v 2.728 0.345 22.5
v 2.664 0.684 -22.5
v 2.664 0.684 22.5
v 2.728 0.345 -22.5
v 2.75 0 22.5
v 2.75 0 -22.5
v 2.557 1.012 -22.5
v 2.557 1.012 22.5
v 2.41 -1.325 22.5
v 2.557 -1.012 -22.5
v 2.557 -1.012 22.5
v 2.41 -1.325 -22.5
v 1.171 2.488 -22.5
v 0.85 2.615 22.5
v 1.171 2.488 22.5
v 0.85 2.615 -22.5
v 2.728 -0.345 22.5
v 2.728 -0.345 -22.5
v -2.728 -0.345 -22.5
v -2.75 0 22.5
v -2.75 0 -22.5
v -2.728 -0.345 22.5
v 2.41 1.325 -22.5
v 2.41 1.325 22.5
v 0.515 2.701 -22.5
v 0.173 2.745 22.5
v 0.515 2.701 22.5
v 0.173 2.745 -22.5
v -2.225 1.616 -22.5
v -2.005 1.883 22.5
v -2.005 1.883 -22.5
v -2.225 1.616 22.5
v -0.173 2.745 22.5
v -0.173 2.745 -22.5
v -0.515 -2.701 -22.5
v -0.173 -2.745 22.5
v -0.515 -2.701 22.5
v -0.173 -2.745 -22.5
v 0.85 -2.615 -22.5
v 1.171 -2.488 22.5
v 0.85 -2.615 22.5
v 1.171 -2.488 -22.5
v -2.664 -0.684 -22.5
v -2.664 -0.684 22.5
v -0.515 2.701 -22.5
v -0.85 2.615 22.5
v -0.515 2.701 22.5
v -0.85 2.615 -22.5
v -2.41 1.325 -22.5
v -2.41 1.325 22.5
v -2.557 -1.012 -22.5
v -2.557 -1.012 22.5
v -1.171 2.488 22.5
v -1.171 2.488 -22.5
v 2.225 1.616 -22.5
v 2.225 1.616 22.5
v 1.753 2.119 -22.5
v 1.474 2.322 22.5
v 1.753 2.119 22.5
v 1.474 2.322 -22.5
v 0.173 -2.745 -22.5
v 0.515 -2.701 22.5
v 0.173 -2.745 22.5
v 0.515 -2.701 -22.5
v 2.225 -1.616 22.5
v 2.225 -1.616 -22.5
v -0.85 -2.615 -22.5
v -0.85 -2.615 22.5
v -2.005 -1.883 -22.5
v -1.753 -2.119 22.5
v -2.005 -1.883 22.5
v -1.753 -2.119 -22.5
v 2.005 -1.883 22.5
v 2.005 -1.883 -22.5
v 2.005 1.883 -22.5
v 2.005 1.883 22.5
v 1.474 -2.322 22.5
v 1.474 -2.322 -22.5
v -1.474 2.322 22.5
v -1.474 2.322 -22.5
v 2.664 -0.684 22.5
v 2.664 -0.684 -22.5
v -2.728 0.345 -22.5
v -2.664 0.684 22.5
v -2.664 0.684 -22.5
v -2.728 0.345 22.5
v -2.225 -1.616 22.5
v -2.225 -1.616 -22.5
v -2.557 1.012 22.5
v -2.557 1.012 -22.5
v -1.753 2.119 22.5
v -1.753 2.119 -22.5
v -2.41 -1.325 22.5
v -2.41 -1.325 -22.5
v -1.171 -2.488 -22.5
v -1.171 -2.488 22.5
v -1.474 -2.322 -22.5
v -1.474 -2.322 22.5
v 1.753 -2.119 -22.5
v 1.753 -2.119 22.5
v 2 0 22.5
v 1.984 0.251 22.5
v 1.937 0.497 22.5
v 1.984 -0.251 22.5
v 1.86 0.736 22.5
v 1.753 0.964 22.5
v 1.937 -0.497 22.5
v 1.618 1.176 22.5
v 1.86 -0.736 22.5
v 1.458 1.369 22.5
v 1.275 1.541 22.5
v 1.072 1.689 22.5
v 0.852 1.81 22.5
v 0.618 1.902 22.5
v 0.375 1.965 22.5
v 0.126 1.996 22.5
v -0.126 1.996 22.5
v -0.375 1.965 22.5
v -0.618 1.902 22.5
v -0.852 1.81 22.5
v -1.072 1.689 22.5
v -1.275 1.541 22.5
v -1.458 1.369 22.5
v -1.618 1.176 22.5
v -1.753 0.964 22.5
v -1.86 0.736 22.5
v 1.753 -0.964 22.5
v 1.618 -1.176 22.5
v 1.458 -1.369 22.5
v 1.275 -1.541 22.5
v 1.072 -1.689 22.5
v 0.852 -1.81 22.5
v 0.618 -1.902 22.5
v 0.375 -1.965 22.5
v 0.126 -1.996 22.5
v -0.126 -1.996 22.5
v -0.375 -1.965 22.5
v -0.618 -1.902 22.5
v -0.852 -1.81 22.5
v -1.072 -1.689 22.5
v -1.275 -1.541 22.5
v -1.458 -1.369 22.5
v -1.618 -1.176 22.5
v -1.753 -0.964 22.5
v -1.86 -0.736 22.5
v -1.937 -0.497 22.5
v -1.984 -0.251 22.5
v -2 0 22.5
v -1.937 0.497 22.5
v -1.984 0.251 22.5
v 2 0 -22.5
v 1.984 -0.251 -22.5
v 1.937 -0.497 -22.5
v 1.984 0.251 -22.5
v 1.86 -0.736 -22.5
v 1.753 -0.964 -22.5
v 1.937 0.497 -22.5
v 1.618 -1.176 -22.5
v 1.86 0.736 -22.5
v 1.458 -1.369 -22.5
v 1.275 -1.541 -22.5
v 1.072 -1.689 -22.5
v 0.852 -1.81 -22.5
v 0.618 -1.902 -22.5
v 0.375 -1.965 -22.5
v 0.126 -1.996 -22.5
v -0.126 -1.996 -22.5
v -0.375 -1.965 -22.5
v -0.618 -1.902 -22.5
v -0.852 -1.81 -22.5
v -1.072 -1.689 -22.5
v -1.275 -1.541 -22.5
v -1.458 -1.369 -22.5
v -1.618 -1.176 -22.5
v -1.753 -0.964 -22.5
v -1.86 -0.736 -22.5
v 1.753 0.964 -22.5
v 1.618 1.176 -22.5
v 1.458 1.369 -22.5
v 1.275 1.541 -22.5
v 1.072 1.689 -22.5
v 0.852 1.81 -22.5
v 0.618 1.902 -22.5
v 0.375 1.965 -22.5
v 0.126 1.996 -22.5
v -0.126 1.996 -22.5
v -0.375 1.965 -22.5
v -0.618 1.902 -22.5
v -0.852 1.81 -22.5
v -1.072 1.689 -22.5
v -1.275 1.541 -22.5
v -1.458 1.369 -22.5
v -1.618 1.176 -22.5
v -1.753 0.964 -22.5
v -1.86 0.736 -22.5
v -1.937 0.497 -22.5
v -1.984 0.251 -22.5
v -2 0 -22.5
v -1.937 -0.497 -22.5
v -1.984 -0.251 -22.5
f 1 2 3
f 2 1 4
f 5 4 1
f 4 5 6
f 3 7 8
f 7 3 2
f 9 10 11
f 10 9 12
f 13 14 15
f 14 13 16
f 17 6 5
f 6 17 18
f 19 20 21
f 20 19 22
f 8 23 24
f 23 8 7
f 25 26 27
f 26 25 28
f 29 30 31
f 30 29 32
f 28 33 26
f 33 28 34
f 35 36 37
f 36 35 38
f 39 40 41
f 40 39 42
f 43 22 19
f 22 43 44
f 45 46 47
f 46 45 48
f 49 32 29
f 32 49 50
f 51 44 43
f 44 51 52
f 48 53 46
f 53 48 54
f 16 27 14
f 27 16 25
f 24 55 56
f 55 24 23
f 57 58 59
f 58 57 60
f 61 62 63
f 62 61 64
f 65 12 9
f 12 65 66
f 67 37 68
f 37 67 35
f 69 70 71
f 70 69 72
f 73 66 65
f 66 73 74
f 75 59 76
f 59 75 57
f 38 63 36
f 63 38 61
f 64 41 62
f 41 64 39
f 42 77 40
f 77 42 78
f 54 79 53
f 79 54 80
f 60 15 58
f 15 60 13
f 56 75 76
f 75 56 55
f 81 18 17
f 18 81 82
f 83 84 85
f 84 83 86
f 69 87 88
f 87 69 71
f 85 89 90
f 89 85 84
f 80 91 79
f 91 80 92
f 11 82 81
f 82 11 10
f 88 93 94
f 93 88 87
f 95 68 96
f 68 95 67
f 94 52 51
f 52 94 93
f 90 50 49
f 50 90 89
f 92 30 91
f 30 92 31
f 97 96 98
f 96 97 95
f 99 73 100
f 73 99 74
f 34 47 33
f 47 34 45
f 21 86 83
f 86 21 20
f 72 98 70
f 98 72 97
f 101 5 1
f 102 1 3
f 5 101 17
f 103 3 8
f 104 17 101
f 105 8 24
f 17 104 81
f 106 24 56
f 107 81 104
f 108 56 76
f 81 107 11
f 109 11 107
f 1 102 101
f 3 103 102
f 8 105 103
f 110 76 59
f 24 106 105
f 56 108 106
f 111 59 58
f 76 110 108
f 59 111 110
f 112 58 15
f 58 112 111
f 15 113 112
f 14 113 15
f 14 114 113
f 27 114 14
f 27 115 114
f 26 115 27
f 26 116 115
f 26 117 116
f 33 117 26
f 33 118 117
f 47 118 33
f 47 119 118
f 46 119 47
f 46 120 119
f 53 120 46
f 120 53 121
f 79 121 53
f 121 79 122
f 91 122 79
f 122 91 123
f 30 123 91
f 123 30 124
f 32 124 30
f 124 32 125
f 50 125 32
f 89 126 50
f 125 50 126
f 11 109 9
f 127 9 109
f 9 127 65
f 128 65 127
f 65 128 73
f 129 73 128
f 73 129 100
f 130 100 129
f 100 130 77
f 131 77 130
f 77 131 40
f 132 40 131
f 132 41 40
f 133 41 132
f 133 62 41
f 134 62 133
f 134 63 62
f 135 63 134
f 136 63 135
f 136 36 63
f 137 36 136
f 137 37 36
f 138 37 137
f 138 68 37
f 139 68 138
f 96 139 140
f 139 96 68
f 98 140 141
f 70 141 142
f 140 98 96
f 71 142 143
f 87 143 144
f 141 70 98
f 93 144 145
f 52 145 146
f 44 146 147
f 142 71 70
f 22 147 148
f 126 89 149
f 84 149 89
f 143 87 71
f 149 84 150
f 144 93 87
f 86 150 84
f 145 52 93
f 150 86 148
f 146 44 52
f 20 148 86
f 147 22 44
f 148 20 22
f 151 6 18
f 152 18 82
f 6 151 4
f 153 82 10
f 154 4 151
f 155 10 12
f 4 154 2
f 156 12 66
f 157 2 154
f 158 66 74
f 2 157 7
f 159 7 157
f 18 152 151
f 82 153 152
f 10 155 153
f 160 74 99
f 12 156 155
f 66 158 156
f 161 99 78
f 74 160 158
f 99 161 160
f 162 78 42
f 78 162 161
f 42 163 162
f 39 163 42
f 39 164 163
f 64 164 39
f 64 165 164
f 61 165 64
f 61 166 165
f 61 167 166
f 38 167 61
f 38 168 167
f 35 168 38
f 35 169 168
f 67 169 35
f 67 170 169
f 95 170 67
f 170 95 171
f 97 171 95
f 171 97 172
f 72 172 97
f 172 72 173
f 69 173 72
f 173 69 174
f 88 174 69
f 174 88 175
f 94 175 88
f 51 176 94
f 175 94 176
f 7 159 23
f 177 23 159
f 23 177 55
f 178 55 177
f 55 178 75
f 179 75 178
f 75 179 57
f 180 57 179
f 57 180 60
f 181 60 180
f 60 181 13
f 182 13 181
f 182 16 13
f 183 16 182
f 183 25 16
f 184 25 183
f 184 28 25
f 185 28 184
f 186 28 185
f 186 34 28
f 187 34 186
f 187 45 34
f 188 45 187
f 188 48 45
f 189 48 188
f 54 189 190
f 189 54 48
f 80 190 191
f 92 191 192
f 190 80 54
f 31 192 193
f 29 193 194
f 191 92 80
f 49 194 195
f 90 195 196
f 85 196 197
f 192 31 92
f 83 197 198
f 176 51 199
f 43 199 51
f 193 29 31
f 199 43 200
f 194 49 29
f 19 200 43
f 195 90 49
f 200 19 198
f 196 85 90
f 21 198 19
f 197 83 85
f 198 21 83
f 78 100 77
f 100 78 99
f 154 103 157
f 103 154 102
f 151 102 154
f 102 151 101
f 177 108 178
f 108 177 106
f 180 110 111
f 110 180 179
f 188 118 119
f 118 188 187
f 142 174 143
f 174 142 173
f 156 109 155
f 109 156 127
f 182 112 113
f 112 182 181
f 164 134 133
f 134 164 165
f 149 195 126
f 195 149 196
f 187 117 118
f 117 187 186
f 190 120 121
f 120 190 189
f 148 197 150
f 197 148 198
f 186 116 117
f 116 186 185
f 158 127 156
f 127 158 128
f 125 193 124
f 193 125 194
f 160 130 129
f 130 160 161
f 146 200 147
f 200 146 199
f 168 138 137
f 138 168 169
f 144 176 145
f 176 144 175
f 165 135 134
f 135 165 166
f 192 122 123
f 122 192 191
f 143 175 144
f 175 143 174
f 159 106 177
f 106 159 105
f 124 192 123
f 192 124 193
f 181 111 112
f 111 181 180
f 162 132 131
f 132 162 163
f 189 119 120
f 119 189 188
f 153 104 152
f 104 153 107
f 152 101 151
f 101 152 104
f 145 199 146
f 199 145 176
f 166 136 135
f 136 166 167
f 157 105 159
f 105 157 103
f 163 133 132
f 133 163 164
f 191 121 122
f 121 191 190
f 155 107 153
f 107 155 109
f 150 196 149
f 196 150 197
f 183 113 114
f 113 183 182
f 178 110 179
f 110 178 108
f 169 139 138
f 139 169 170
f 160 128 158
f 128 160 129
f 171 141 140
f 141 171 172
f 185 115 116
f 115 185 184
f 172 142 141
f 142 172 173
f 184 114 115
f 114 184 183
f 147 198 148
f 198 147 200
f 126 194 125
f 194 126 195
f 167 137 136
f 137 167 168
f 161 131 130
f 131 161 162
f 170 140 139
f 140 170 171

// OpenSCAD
$fn = 50;


difference() {
	union() {
		translate(v = [0, 0, -22.5000000000]) {
			cylinder(h = 45, r = 2.7500000000);
		}
	}
	union() {
		translate(v = [0, 0, -100.0000000000]) {
			cylinder(h = 200, r = 2.0000000000);
		}
	}
}
